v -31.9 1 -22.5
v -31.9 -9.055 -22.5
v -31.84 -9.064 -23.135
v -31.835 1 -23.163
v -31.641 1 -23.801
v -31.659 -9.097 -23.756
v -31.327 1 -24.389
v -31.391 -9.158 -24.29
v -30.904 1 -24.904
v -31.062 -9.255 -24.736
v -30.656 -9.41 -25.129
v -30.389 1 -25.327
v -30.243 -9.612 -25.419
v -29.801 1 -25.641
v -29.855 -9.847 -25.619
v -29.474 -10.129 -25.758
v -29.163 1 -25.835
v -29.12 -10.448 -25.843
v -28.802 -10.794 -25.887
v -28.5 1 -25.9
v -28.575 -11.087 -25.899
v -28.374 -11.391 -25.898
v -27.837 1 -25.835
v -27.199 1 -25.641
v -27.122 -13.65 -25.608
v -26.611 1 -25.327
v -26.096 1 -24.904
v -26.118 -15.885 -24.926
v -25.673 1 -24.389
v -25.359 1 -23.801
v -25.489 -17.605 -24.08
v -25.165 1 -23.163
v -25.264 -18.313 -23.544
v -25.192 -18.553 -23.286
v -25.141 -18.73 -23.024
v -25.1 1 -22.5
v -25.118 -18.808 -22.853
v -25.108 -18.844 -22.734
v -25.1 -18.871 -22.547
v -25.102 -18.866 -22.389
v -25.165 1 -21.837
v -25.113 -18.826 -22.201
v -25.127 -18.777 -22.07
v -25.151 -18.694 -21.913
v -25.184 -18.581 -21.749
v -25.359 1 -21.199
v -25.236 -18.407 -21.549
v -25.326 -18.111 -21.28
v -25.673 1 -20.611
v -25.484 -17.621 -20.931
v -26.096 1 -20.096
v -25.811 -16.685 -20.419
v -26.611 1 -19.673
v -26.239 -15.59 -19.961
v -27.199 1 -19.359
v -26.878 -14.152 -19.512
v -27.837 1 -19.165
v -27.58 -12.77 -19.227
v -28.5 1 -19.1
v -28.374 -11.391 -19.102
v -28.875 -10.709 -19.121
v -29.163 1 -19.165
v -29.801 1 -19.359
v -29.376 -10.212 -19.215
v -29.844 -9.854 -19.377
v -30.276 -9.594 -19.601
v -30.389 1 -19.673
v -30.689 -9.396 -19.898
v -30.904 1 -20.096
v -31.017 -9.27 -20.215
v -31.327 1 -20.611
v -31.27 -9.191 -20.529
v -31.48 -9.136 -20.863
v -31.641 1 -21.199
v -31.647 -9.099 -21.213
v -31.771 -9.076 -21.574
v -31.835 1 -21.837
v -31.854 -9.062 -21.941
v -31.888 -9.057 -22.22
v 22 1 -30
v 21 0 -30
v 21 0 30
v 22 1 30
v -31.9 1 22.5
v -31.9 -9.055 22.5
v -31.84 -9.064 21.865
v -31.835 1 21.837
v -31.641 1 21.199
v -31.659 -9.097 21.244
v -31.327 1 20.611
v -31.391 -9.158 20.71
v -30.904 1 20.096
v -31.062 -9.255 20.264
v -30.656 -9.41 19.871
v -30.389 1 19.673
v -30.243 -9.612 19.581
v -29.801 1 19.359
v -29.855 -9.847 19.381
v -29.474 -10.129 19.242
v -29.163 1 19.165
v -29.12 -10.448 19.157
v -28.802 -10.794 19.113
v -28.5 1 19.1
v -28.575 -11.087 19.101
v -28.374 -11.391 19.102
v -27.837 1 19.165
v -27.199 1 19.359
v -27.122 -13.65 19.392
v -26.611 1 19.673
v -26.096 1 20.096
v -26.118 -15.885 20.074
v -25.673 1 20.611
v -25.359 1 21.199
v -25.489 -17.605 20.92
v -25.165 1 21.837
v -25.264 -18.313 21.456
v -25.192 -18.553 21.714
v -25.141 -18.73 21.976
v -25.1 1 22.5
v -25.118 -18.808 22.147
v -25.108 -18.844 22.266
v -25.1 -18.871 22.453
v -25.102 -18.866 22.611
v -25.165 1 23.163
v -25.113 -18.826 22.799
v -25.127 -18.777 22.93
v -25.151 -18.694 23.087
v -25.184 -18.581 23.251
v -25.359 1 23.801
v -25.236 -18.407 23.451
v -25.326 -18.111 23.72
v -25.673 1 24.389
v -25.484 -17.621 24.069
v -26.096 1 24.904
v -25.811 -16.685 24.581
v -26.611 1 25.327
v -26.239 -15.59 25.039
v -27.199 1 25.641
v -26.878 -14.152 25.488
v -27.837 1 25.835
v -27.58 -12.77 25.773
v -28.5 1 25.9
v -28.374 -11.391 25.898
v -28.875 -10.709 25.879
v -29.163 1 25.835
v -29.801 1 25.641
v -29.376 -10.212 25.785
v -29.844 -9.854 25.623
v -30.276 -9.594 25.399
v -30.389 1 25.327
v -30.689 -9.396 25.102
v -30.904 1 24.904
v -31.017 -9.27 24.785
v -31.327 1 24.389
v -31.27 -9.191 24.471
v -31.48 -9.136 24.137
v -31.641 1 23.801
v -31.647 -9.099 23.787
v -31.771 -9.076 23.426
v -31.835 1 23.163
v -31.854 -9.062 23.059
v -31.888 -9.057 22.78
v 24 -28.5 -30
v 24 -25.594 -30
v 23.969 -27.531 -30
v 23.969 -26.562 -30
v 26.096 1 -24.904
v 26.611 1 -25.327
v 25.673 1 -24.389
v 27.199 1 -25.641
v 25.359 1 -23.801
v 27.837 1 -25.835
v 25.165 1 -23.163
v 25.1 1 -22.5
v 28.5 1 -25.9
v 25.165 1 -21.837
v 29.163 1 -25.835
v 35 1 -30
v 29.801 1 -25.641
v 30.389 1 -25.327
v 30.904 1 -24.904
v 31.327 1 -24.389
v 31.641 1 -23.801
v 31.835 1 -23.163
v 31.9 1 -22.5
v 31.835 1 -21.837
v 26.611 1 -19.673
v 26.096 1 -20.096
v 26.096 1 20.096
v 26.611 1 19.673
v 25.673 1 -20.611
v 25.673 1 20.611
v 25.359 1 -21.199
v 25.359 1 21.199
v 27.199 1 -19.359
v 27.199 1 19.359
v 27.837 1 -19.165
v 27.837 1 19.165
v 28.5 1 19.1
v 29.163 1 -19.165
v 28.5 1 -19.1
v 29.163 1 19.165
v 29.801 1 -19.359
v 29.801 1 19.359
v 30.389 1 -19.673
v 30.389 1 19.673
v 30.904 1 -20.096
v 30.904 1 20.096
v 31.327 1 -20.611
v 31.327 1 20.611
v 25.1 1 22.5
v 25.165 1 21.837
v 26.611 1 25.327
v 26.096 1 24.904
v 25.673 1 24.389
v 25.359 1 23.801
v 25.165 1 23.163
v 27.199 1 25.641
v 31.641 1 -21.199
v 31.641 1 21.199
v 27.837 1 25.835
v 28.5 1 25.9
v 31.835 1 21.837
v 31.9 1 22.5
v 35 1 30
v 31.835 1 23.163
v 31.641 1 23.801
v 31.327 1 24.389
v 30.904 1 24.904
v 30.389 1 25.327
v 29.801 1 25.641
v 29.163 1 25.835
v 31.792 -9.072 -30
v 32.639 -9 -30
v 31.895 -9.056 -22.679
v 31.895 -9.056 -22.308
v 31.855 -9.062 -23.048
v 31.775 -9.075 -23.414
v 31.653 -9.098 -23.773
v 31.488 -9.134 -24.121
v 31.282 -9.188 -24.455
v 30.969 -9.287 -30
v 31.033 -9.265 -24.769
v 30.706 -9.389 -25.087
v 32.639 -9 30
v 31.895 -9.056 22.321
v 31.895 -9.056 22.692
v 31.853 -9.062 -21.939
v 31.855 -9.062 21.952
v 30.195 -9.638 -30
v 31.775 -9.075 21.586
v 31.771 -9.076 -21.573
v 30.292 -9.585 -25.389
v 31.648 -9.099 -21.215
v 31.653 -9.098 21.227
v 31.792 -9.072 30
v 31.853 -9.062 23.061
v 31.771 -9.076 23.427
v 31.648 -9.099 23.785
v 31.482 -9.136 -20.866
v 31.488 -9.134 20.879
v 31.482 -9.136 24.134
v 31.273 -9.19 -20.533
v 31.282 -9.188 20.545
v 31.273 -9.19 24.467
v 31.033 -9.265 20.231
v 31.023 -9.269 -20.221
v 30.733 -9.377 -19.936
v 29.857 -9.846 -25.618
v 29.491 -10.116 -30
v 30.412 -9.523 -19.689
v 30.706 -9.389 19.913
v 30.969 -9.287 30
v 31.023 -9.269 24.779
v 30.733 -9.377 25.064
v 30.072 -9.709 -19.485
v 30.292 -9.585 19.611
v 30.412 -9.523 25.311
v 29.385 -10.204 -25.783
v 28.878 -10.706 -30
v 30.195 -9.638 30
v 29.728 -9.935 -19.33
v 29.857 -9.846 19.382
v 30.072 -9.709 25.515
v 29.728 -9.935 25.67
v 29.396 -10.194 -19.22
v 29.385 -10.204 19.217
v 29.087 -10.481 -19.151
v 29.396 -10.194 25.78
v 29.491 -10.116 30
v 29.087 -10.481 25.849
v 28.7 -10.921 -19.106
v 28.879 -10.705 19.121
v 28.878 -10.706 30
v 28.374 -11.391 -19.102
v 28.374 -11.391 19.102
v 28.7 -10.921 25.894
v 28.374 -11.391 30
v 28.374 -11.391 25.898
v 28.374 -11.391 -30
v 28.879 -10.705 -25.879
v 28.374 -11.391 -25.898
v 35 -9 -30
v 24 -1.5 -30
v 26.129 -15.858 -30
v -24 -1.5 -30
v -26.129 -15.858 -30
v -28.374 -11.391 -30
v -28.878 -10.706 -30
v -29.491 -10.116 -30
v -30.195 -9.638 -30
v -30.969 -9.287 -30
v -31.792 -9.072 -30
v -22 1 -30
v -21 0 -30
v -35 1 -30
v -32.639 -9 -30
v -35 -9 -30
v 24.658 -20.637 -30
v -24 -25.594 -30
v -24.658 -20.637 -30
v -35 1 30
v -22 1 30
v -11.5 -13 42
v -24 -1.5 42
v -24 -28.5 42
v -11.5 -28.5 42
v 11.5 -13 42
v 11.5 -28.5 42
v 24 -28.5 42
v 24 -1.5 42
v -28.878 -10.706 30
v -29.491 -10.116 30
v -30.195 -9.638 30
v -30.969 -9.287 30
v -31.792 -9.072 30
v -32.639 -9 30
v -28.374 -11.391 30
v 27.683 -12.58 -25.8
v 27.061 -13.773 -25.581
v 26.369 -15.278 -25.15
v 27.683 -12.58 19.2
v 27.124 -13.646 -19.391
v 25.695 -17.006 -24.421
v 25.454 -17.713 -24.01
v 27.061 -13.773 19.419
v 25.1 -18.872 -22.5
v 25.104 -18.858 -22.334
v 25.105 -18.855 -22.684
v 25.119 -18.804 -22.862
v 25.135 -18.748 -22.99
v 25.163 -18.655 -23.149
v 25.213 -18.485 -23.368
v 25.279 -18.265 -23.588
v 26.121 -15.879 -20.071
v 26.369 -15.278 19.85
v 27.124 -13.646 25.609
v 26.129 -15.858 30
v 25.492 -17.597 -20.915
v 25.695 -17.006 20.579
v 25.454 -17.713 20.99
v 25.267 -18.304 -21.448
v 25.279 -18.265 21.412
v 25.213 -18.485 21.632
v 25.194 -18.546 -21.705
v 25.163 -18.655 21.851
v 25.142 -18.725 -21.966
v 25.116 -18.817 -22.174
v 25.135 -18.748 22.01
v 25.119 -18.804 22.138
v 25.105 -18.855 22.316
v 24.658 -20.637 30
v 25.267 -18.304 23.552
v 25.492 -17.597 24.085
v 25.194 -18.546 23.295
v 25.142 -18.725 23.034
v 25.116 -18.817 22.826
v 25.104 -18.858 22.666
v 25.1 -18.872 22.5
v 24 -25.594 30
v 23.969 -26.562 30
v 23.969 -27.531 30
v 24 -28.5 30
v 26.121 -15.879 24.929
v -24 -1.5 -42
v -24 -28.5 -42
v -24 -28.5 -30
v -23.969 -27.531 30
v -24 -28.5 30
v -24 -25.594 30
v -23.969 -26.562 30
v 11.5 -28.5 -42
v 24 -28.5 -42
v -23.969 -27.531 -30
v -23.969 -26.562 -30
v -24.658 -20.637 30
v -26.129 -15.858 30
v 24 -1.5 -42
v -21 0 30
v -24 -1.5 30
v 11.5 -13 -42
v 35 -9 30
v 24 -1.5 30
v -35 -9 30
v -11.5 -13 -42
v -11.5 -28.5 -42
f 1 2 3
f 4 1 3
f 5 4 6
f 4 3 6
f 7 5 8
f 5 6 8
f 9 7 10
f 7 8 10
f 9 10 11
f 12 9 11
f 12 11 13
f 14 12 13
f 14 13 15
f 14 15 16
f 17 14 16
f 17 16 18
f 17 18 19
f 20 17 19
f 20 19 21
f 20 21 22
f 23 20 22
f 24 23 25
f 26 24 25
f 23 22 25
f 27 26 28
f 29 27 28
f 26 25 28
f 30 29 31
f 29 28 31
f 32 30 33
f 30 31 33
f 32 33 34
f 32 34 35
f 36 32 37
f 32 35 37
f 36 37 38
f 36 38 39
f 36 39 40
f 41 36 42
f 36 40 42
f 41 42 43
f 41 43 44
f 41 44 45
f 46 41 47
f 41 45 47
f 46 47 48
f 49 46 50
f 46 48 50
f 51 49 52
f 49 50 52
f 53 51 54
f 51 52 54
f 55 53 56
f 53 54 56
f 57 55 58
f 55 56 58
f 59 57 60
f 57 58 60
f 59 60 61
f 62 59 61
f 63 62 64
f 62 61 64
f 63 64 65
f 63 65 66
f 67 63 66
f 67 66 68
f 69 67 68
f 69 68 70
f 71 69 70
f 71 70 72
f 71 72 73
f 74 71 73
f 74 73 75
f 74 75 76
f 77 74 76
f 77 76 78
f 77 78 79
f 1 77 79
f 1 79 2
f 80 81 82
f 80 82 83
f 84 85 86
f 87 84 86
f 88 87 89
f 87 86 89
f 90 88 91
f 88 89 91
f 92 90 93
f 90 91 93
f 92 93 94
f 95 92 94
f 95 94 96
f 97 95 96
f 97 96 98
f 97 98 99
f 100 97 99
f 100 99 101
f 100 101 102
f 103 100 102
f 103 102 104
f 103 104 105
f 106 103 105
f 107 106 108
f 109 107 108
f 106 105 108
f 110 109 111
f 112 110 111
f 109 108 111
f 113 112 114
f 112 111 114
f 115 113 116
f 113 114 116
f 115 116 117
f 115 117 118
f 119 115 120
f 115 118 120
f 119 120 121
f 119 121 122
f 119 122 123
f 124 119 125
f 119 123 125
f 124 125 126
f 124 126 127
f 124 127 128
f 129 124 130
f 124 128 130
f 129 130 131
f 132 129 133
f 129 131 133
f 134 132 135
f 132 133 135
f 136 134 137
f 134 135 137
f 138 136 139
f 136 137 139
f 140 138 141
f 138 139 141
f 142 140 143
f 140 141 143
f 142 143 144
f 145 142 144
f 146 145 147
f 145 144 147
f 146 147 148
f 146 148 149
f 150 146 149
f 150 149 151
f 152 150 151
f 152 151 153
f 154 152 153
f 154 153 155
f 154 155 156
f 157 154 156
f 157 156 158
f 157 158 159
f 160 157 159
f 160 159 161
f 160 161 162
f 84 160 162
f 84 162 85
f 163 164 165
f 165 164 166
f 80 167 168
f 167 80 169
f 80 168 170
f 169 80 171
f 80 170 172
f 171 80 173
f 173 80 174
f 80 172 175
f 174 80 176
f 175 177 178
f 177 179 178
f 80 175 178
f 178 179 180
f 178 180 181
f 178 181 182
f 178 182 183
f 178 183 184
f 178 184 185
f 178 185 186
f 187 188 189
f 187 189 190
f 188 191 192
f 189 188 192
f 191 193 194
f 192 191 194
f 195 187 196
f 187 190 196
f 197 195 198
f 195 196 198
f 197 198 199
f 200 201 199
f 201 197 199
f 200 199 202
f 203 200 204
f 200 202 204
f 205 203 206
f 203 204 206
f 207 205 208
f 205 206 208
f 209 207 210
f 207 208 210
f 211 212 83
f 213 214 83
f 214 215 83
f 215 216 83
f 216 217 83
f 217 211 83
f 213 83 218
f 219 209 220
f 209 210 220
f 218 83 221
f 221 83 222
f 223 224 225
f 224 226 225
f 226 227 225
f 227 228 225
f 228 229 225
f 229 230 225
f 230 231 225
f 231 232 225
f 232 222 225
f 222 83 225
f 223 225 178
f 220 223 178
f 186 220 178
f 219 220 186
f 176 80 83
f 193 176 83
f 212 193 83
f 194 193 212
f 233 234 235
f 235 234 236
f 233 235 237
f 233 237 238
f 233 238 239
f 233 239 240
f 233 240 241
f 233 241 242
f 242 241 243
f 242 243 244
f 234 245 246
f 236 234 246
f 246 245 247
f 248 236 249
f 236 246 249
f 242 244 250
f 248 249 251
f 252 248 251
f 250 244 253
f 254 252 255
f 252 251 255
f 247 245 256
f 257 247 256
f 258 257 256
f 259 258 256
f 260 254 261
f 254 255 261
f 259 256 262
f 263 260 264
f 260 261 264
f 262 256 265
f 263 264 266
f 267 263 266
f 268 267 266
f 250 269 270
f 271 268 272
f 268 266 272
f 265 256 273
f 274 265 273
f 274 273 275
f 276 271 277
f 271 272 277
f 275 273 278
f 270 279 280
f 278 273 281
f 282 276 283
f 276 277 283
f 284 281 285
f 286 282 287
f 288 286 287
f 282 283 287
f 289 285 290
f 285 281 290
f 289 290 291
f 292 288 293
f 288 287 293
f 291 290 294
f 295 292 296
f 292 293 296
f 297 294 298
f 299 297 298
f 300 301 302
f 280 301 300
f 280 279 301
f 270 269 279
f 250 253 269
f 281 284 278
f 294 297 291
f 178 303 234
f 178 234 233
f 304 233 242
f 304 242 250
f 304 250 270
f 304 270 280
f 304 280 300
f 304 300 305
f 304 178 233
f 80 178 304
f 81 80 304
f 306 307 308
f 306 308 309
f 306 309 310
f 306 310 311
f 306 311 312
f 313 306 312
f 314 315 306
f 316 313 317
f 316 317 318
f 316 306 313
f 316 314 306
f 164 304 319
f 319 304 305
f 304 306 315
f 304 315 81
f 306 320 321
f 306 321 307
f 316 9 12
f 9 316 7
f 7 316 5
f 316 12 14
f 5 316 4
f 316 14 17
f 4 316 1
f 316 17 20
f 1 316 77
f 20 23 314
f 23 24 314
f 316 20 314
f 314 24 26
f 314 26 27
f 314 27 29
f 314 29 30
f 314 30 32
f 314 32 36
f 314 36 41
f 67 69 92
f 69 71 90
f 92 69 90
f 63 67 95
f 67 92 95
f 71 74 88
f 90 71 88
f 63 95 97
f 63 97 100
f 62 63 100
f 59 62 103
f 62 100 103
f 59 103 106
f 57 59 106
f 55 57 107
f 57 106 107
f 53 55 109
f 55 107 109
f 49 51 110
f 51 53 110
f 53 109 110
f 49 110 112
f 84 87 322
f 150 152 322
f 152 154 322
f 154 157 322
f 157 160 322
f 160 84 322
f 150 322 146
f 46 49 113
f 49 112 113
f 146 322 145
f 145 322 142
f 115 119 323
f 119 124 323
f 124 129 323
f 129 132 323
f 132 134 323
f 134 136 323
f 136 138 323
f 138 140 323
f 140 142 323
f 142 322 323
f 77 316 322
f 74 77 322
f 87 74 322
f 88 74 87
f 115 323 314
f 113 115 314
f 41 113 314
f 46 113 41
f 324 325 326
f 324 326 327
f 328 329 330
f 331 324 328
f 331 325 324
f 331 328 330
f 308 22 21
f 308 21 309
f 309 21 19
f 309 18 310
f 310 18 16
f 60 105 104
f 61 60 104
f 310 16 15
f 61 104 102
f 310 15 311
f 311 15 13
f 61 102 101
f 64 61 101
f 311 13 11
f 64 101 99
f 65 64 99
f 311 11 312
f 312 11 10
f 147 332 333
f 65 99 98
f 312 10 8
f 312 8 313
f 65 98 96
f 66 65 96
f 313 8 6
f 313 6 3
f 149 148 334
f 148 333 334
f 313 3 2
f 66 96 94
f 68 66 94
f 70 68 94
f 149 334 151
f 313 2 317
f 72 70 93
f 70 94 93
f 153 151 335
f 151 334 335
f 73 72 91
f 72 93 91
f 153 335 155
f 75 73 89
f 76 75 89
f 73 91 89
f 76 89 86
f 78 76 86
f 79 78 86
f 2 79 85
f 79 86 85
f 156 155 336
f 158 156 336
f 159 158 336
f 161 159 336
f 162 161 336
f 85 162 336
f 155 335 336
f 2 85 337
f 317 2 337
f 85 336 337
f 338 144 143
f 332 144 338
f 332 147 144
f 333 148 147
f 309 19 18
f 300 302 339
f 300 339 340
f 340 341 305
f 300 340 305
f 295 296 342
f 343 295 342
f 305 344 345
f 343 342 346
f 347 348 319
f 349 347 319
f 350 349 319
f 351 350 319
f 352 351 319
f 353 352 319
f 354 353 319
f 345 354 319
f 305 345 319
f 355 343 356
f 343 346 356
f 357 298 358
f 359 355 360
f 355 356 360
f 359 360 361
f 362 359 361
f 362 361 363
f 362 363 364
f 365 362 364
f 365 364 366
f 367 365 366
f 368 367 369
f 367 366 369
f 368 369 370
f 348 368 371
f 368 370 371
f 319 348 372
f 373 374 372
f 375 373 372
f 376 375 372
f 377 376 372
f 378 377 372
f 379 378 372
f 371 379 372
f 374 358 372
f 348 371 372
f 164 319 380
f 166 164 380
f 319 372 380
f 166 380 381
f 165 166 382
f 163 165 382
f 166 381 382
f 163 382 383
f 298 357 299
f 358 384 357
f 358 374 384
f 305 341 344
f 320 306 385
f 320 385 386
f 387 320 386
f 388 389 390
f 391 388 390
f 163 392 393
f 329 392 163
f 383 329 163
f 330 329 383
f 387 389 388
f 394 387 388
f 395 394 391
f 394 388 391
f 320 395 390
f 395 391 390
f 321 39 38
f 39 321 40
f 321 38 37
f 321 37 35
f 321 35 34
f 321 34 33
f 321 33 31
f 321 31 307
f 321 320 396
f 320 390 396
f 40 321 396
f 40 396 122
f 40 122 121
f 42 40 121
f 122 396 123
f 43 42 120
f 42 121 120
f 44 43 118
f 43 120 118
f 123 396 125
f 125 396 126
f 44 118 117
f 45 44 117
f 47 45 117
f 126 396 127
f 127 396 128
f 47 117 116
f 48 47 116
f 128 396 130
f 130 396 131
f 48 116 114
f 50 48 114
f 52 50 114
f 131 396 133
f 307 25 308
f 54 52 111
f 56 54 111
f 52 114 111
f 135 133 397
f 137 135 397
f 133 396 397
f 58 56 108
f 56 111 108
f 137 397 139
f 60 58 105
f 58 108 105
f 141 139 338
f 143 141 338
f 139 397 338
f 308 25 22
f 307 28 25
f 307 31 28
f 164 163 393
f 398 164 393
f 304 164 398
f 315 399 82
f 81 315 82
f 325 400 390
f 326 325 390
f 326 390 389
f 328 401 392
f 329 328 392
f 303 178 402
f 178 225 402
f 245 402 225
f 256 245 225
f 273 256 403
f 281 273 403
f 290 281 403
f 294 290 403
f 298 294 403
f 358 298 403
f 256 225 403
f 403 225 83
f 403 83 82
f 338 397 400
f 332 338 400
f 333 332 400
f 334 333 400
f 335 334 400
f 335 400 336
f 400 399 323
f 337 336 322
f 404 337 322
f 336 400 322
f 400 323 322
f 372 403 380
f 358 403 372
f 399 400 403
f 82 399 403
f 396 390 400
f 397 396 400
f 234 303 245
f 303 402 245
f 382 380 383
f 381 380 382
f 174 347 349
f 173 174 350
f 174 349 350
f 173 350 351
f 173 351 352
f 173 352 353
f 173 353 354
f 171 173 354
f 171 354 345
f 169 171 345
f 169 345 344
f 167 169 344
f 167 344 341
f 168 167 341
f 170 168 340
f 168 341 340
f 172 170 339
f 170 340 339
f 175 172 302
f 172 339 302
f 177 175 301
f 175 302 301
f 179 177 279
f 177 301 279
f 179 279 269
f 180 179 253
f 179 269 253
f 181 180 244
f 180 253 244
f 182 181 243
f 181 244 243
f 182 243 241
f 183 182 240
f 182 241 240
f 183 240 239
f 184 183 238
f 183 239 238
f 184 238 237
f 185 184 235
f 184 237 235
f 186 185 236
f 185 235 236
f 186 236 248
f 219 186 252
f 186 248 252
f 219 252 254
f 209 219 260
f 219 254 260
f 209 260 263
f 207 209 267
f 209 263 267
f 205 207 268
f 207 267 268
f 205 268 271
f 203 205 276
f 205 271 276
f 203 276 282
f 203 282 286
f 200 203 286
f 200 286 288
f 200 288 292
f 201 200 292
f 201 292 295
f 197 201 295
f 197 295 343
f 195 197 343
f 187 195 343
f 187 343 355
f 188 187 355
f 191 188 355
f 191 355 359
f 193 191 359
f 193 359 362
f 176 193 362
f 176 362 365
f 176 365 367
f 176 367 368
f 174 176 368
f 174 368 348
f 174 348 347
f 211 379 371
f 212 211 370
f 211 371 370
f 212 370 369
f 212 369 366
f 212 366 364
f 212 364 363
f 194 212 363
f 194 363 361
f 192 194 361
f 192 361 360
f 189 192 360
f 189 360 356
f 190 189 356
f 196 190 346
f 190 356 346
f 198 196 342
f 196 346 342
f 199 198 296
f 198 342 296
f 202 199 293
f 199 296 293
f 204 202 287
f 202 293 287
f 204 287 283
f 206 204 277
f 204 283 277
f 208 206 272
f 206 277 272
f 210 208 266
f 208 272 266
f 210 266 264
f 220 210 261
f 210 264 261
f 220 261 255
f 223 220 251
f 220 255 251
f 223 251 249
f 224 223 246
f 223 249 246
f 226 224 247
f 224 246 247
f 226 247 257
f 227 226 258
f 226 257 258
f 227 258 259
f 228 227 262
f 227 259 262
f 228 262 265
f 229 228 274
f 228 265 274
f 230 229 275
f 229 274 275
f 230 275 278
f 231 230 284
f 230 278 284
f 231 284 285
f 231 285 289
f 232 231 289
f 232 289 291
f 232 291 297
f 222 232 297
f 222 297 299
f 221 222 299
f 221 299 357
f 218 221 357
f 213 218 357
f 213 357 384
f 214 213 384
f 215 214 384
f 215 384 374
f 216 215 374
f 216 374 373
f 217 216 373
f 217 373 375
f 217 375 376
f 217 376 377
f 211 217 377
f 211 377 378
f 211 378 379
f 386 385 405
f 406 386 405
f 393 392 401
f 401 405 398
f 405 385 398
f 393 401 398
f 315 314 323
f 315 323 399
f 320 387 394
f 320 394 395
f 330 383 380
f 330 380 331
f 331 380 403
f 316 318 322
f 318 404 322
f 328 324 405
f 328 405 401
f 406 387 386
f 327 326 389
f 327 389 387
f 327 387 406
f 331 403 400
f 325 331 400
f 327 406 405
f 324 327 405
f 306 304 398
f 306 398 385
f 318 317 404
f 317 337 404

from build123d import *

# Parameters (mm, degrees)
EXTRUDE_1_DEPTH    = 30
HOLE_WIZARD_M8_1_D = 6.8
EXTRUDE_2_DEPTH    = 12


with BuildPart() as part:
    # 草图1 → 凸台-拉伸1 (new body, symmetric)
    with BuildSketch(Plane.XY):
        with BuildLine():
            Line((-21, 0), (21, 0))
            Line((21, 0), (22, 1))
            Line((22, 1), (35, 1))
            Line((35, 1), (35, -9))
            Line((35, -9), (32.639225352, -9))
            ThreePointArc((32.639225352, -9), (30.19452262, -9.638414445), (28.374113304, -11.390628579))
            ThreePointArc((28.374113304, -11.390628579), (24.899602423, -19.616168903), (24, -28.5))
            Line((24, -28.5), (11.5, -28.5))
            Line((11.5, -28.5), (11.5, -13))
            Line((11.5, -13), (-11.5, -13))
            Line((-11.5, -13), (-11.5, -28.5))
            Line((-11.5, -28.5), (-24, -28.5))
            ThreePointArc((-24, -28.5), (-24.899602423, -19.616168903), (-28.374113304, -11.390628579))
            ThreePointArc((-28.374113304, -11.390628579), (-30.19452262, -9.638414445), (-32.639225352, -9))
            Line((-32.639225352, -9), (-35, -9))
            Line((-35, -9), (-35, 1))
            Line((-35, 1), (-22, 1))
            Line((-22, 1), (-21, 0))
        make_face()
    extrude(amount=EXTRUDE_1_DEPTH, both=True)

    # M8 螺纹孔1 (through all)
    with Locations(Plane(origin=(0, 1, 0), x_dir=(1, 0, 0), z_dir=(0, 1, 0))):
        with Locations((-28.5, 22.5), (28.5, 22.5), (28.5, -22.5), (-28.5, -22.5)):
            Hole(HOLE_WIZARD_M8_1_D / 2)

    # 草图4 → 凸台-拉伸2 (add)
    with BuildSketch(Plane.XY.offset(30)):
        Polygon((-11.5, -28.5), (-11.5, -13), (11.5, -13), (11.5, -28.5), (24, -28.5), (24, -1.5), (-24, -1.5), (-24, -28.5), align=None)
    extrude_2 = extrude(amount=EXTRUDE_2_DEPTH)

    # 镜向1: 凸台-拉伸2 across plane
    add(extrude_2.mirror(Plane.XY))


solid = part.part
